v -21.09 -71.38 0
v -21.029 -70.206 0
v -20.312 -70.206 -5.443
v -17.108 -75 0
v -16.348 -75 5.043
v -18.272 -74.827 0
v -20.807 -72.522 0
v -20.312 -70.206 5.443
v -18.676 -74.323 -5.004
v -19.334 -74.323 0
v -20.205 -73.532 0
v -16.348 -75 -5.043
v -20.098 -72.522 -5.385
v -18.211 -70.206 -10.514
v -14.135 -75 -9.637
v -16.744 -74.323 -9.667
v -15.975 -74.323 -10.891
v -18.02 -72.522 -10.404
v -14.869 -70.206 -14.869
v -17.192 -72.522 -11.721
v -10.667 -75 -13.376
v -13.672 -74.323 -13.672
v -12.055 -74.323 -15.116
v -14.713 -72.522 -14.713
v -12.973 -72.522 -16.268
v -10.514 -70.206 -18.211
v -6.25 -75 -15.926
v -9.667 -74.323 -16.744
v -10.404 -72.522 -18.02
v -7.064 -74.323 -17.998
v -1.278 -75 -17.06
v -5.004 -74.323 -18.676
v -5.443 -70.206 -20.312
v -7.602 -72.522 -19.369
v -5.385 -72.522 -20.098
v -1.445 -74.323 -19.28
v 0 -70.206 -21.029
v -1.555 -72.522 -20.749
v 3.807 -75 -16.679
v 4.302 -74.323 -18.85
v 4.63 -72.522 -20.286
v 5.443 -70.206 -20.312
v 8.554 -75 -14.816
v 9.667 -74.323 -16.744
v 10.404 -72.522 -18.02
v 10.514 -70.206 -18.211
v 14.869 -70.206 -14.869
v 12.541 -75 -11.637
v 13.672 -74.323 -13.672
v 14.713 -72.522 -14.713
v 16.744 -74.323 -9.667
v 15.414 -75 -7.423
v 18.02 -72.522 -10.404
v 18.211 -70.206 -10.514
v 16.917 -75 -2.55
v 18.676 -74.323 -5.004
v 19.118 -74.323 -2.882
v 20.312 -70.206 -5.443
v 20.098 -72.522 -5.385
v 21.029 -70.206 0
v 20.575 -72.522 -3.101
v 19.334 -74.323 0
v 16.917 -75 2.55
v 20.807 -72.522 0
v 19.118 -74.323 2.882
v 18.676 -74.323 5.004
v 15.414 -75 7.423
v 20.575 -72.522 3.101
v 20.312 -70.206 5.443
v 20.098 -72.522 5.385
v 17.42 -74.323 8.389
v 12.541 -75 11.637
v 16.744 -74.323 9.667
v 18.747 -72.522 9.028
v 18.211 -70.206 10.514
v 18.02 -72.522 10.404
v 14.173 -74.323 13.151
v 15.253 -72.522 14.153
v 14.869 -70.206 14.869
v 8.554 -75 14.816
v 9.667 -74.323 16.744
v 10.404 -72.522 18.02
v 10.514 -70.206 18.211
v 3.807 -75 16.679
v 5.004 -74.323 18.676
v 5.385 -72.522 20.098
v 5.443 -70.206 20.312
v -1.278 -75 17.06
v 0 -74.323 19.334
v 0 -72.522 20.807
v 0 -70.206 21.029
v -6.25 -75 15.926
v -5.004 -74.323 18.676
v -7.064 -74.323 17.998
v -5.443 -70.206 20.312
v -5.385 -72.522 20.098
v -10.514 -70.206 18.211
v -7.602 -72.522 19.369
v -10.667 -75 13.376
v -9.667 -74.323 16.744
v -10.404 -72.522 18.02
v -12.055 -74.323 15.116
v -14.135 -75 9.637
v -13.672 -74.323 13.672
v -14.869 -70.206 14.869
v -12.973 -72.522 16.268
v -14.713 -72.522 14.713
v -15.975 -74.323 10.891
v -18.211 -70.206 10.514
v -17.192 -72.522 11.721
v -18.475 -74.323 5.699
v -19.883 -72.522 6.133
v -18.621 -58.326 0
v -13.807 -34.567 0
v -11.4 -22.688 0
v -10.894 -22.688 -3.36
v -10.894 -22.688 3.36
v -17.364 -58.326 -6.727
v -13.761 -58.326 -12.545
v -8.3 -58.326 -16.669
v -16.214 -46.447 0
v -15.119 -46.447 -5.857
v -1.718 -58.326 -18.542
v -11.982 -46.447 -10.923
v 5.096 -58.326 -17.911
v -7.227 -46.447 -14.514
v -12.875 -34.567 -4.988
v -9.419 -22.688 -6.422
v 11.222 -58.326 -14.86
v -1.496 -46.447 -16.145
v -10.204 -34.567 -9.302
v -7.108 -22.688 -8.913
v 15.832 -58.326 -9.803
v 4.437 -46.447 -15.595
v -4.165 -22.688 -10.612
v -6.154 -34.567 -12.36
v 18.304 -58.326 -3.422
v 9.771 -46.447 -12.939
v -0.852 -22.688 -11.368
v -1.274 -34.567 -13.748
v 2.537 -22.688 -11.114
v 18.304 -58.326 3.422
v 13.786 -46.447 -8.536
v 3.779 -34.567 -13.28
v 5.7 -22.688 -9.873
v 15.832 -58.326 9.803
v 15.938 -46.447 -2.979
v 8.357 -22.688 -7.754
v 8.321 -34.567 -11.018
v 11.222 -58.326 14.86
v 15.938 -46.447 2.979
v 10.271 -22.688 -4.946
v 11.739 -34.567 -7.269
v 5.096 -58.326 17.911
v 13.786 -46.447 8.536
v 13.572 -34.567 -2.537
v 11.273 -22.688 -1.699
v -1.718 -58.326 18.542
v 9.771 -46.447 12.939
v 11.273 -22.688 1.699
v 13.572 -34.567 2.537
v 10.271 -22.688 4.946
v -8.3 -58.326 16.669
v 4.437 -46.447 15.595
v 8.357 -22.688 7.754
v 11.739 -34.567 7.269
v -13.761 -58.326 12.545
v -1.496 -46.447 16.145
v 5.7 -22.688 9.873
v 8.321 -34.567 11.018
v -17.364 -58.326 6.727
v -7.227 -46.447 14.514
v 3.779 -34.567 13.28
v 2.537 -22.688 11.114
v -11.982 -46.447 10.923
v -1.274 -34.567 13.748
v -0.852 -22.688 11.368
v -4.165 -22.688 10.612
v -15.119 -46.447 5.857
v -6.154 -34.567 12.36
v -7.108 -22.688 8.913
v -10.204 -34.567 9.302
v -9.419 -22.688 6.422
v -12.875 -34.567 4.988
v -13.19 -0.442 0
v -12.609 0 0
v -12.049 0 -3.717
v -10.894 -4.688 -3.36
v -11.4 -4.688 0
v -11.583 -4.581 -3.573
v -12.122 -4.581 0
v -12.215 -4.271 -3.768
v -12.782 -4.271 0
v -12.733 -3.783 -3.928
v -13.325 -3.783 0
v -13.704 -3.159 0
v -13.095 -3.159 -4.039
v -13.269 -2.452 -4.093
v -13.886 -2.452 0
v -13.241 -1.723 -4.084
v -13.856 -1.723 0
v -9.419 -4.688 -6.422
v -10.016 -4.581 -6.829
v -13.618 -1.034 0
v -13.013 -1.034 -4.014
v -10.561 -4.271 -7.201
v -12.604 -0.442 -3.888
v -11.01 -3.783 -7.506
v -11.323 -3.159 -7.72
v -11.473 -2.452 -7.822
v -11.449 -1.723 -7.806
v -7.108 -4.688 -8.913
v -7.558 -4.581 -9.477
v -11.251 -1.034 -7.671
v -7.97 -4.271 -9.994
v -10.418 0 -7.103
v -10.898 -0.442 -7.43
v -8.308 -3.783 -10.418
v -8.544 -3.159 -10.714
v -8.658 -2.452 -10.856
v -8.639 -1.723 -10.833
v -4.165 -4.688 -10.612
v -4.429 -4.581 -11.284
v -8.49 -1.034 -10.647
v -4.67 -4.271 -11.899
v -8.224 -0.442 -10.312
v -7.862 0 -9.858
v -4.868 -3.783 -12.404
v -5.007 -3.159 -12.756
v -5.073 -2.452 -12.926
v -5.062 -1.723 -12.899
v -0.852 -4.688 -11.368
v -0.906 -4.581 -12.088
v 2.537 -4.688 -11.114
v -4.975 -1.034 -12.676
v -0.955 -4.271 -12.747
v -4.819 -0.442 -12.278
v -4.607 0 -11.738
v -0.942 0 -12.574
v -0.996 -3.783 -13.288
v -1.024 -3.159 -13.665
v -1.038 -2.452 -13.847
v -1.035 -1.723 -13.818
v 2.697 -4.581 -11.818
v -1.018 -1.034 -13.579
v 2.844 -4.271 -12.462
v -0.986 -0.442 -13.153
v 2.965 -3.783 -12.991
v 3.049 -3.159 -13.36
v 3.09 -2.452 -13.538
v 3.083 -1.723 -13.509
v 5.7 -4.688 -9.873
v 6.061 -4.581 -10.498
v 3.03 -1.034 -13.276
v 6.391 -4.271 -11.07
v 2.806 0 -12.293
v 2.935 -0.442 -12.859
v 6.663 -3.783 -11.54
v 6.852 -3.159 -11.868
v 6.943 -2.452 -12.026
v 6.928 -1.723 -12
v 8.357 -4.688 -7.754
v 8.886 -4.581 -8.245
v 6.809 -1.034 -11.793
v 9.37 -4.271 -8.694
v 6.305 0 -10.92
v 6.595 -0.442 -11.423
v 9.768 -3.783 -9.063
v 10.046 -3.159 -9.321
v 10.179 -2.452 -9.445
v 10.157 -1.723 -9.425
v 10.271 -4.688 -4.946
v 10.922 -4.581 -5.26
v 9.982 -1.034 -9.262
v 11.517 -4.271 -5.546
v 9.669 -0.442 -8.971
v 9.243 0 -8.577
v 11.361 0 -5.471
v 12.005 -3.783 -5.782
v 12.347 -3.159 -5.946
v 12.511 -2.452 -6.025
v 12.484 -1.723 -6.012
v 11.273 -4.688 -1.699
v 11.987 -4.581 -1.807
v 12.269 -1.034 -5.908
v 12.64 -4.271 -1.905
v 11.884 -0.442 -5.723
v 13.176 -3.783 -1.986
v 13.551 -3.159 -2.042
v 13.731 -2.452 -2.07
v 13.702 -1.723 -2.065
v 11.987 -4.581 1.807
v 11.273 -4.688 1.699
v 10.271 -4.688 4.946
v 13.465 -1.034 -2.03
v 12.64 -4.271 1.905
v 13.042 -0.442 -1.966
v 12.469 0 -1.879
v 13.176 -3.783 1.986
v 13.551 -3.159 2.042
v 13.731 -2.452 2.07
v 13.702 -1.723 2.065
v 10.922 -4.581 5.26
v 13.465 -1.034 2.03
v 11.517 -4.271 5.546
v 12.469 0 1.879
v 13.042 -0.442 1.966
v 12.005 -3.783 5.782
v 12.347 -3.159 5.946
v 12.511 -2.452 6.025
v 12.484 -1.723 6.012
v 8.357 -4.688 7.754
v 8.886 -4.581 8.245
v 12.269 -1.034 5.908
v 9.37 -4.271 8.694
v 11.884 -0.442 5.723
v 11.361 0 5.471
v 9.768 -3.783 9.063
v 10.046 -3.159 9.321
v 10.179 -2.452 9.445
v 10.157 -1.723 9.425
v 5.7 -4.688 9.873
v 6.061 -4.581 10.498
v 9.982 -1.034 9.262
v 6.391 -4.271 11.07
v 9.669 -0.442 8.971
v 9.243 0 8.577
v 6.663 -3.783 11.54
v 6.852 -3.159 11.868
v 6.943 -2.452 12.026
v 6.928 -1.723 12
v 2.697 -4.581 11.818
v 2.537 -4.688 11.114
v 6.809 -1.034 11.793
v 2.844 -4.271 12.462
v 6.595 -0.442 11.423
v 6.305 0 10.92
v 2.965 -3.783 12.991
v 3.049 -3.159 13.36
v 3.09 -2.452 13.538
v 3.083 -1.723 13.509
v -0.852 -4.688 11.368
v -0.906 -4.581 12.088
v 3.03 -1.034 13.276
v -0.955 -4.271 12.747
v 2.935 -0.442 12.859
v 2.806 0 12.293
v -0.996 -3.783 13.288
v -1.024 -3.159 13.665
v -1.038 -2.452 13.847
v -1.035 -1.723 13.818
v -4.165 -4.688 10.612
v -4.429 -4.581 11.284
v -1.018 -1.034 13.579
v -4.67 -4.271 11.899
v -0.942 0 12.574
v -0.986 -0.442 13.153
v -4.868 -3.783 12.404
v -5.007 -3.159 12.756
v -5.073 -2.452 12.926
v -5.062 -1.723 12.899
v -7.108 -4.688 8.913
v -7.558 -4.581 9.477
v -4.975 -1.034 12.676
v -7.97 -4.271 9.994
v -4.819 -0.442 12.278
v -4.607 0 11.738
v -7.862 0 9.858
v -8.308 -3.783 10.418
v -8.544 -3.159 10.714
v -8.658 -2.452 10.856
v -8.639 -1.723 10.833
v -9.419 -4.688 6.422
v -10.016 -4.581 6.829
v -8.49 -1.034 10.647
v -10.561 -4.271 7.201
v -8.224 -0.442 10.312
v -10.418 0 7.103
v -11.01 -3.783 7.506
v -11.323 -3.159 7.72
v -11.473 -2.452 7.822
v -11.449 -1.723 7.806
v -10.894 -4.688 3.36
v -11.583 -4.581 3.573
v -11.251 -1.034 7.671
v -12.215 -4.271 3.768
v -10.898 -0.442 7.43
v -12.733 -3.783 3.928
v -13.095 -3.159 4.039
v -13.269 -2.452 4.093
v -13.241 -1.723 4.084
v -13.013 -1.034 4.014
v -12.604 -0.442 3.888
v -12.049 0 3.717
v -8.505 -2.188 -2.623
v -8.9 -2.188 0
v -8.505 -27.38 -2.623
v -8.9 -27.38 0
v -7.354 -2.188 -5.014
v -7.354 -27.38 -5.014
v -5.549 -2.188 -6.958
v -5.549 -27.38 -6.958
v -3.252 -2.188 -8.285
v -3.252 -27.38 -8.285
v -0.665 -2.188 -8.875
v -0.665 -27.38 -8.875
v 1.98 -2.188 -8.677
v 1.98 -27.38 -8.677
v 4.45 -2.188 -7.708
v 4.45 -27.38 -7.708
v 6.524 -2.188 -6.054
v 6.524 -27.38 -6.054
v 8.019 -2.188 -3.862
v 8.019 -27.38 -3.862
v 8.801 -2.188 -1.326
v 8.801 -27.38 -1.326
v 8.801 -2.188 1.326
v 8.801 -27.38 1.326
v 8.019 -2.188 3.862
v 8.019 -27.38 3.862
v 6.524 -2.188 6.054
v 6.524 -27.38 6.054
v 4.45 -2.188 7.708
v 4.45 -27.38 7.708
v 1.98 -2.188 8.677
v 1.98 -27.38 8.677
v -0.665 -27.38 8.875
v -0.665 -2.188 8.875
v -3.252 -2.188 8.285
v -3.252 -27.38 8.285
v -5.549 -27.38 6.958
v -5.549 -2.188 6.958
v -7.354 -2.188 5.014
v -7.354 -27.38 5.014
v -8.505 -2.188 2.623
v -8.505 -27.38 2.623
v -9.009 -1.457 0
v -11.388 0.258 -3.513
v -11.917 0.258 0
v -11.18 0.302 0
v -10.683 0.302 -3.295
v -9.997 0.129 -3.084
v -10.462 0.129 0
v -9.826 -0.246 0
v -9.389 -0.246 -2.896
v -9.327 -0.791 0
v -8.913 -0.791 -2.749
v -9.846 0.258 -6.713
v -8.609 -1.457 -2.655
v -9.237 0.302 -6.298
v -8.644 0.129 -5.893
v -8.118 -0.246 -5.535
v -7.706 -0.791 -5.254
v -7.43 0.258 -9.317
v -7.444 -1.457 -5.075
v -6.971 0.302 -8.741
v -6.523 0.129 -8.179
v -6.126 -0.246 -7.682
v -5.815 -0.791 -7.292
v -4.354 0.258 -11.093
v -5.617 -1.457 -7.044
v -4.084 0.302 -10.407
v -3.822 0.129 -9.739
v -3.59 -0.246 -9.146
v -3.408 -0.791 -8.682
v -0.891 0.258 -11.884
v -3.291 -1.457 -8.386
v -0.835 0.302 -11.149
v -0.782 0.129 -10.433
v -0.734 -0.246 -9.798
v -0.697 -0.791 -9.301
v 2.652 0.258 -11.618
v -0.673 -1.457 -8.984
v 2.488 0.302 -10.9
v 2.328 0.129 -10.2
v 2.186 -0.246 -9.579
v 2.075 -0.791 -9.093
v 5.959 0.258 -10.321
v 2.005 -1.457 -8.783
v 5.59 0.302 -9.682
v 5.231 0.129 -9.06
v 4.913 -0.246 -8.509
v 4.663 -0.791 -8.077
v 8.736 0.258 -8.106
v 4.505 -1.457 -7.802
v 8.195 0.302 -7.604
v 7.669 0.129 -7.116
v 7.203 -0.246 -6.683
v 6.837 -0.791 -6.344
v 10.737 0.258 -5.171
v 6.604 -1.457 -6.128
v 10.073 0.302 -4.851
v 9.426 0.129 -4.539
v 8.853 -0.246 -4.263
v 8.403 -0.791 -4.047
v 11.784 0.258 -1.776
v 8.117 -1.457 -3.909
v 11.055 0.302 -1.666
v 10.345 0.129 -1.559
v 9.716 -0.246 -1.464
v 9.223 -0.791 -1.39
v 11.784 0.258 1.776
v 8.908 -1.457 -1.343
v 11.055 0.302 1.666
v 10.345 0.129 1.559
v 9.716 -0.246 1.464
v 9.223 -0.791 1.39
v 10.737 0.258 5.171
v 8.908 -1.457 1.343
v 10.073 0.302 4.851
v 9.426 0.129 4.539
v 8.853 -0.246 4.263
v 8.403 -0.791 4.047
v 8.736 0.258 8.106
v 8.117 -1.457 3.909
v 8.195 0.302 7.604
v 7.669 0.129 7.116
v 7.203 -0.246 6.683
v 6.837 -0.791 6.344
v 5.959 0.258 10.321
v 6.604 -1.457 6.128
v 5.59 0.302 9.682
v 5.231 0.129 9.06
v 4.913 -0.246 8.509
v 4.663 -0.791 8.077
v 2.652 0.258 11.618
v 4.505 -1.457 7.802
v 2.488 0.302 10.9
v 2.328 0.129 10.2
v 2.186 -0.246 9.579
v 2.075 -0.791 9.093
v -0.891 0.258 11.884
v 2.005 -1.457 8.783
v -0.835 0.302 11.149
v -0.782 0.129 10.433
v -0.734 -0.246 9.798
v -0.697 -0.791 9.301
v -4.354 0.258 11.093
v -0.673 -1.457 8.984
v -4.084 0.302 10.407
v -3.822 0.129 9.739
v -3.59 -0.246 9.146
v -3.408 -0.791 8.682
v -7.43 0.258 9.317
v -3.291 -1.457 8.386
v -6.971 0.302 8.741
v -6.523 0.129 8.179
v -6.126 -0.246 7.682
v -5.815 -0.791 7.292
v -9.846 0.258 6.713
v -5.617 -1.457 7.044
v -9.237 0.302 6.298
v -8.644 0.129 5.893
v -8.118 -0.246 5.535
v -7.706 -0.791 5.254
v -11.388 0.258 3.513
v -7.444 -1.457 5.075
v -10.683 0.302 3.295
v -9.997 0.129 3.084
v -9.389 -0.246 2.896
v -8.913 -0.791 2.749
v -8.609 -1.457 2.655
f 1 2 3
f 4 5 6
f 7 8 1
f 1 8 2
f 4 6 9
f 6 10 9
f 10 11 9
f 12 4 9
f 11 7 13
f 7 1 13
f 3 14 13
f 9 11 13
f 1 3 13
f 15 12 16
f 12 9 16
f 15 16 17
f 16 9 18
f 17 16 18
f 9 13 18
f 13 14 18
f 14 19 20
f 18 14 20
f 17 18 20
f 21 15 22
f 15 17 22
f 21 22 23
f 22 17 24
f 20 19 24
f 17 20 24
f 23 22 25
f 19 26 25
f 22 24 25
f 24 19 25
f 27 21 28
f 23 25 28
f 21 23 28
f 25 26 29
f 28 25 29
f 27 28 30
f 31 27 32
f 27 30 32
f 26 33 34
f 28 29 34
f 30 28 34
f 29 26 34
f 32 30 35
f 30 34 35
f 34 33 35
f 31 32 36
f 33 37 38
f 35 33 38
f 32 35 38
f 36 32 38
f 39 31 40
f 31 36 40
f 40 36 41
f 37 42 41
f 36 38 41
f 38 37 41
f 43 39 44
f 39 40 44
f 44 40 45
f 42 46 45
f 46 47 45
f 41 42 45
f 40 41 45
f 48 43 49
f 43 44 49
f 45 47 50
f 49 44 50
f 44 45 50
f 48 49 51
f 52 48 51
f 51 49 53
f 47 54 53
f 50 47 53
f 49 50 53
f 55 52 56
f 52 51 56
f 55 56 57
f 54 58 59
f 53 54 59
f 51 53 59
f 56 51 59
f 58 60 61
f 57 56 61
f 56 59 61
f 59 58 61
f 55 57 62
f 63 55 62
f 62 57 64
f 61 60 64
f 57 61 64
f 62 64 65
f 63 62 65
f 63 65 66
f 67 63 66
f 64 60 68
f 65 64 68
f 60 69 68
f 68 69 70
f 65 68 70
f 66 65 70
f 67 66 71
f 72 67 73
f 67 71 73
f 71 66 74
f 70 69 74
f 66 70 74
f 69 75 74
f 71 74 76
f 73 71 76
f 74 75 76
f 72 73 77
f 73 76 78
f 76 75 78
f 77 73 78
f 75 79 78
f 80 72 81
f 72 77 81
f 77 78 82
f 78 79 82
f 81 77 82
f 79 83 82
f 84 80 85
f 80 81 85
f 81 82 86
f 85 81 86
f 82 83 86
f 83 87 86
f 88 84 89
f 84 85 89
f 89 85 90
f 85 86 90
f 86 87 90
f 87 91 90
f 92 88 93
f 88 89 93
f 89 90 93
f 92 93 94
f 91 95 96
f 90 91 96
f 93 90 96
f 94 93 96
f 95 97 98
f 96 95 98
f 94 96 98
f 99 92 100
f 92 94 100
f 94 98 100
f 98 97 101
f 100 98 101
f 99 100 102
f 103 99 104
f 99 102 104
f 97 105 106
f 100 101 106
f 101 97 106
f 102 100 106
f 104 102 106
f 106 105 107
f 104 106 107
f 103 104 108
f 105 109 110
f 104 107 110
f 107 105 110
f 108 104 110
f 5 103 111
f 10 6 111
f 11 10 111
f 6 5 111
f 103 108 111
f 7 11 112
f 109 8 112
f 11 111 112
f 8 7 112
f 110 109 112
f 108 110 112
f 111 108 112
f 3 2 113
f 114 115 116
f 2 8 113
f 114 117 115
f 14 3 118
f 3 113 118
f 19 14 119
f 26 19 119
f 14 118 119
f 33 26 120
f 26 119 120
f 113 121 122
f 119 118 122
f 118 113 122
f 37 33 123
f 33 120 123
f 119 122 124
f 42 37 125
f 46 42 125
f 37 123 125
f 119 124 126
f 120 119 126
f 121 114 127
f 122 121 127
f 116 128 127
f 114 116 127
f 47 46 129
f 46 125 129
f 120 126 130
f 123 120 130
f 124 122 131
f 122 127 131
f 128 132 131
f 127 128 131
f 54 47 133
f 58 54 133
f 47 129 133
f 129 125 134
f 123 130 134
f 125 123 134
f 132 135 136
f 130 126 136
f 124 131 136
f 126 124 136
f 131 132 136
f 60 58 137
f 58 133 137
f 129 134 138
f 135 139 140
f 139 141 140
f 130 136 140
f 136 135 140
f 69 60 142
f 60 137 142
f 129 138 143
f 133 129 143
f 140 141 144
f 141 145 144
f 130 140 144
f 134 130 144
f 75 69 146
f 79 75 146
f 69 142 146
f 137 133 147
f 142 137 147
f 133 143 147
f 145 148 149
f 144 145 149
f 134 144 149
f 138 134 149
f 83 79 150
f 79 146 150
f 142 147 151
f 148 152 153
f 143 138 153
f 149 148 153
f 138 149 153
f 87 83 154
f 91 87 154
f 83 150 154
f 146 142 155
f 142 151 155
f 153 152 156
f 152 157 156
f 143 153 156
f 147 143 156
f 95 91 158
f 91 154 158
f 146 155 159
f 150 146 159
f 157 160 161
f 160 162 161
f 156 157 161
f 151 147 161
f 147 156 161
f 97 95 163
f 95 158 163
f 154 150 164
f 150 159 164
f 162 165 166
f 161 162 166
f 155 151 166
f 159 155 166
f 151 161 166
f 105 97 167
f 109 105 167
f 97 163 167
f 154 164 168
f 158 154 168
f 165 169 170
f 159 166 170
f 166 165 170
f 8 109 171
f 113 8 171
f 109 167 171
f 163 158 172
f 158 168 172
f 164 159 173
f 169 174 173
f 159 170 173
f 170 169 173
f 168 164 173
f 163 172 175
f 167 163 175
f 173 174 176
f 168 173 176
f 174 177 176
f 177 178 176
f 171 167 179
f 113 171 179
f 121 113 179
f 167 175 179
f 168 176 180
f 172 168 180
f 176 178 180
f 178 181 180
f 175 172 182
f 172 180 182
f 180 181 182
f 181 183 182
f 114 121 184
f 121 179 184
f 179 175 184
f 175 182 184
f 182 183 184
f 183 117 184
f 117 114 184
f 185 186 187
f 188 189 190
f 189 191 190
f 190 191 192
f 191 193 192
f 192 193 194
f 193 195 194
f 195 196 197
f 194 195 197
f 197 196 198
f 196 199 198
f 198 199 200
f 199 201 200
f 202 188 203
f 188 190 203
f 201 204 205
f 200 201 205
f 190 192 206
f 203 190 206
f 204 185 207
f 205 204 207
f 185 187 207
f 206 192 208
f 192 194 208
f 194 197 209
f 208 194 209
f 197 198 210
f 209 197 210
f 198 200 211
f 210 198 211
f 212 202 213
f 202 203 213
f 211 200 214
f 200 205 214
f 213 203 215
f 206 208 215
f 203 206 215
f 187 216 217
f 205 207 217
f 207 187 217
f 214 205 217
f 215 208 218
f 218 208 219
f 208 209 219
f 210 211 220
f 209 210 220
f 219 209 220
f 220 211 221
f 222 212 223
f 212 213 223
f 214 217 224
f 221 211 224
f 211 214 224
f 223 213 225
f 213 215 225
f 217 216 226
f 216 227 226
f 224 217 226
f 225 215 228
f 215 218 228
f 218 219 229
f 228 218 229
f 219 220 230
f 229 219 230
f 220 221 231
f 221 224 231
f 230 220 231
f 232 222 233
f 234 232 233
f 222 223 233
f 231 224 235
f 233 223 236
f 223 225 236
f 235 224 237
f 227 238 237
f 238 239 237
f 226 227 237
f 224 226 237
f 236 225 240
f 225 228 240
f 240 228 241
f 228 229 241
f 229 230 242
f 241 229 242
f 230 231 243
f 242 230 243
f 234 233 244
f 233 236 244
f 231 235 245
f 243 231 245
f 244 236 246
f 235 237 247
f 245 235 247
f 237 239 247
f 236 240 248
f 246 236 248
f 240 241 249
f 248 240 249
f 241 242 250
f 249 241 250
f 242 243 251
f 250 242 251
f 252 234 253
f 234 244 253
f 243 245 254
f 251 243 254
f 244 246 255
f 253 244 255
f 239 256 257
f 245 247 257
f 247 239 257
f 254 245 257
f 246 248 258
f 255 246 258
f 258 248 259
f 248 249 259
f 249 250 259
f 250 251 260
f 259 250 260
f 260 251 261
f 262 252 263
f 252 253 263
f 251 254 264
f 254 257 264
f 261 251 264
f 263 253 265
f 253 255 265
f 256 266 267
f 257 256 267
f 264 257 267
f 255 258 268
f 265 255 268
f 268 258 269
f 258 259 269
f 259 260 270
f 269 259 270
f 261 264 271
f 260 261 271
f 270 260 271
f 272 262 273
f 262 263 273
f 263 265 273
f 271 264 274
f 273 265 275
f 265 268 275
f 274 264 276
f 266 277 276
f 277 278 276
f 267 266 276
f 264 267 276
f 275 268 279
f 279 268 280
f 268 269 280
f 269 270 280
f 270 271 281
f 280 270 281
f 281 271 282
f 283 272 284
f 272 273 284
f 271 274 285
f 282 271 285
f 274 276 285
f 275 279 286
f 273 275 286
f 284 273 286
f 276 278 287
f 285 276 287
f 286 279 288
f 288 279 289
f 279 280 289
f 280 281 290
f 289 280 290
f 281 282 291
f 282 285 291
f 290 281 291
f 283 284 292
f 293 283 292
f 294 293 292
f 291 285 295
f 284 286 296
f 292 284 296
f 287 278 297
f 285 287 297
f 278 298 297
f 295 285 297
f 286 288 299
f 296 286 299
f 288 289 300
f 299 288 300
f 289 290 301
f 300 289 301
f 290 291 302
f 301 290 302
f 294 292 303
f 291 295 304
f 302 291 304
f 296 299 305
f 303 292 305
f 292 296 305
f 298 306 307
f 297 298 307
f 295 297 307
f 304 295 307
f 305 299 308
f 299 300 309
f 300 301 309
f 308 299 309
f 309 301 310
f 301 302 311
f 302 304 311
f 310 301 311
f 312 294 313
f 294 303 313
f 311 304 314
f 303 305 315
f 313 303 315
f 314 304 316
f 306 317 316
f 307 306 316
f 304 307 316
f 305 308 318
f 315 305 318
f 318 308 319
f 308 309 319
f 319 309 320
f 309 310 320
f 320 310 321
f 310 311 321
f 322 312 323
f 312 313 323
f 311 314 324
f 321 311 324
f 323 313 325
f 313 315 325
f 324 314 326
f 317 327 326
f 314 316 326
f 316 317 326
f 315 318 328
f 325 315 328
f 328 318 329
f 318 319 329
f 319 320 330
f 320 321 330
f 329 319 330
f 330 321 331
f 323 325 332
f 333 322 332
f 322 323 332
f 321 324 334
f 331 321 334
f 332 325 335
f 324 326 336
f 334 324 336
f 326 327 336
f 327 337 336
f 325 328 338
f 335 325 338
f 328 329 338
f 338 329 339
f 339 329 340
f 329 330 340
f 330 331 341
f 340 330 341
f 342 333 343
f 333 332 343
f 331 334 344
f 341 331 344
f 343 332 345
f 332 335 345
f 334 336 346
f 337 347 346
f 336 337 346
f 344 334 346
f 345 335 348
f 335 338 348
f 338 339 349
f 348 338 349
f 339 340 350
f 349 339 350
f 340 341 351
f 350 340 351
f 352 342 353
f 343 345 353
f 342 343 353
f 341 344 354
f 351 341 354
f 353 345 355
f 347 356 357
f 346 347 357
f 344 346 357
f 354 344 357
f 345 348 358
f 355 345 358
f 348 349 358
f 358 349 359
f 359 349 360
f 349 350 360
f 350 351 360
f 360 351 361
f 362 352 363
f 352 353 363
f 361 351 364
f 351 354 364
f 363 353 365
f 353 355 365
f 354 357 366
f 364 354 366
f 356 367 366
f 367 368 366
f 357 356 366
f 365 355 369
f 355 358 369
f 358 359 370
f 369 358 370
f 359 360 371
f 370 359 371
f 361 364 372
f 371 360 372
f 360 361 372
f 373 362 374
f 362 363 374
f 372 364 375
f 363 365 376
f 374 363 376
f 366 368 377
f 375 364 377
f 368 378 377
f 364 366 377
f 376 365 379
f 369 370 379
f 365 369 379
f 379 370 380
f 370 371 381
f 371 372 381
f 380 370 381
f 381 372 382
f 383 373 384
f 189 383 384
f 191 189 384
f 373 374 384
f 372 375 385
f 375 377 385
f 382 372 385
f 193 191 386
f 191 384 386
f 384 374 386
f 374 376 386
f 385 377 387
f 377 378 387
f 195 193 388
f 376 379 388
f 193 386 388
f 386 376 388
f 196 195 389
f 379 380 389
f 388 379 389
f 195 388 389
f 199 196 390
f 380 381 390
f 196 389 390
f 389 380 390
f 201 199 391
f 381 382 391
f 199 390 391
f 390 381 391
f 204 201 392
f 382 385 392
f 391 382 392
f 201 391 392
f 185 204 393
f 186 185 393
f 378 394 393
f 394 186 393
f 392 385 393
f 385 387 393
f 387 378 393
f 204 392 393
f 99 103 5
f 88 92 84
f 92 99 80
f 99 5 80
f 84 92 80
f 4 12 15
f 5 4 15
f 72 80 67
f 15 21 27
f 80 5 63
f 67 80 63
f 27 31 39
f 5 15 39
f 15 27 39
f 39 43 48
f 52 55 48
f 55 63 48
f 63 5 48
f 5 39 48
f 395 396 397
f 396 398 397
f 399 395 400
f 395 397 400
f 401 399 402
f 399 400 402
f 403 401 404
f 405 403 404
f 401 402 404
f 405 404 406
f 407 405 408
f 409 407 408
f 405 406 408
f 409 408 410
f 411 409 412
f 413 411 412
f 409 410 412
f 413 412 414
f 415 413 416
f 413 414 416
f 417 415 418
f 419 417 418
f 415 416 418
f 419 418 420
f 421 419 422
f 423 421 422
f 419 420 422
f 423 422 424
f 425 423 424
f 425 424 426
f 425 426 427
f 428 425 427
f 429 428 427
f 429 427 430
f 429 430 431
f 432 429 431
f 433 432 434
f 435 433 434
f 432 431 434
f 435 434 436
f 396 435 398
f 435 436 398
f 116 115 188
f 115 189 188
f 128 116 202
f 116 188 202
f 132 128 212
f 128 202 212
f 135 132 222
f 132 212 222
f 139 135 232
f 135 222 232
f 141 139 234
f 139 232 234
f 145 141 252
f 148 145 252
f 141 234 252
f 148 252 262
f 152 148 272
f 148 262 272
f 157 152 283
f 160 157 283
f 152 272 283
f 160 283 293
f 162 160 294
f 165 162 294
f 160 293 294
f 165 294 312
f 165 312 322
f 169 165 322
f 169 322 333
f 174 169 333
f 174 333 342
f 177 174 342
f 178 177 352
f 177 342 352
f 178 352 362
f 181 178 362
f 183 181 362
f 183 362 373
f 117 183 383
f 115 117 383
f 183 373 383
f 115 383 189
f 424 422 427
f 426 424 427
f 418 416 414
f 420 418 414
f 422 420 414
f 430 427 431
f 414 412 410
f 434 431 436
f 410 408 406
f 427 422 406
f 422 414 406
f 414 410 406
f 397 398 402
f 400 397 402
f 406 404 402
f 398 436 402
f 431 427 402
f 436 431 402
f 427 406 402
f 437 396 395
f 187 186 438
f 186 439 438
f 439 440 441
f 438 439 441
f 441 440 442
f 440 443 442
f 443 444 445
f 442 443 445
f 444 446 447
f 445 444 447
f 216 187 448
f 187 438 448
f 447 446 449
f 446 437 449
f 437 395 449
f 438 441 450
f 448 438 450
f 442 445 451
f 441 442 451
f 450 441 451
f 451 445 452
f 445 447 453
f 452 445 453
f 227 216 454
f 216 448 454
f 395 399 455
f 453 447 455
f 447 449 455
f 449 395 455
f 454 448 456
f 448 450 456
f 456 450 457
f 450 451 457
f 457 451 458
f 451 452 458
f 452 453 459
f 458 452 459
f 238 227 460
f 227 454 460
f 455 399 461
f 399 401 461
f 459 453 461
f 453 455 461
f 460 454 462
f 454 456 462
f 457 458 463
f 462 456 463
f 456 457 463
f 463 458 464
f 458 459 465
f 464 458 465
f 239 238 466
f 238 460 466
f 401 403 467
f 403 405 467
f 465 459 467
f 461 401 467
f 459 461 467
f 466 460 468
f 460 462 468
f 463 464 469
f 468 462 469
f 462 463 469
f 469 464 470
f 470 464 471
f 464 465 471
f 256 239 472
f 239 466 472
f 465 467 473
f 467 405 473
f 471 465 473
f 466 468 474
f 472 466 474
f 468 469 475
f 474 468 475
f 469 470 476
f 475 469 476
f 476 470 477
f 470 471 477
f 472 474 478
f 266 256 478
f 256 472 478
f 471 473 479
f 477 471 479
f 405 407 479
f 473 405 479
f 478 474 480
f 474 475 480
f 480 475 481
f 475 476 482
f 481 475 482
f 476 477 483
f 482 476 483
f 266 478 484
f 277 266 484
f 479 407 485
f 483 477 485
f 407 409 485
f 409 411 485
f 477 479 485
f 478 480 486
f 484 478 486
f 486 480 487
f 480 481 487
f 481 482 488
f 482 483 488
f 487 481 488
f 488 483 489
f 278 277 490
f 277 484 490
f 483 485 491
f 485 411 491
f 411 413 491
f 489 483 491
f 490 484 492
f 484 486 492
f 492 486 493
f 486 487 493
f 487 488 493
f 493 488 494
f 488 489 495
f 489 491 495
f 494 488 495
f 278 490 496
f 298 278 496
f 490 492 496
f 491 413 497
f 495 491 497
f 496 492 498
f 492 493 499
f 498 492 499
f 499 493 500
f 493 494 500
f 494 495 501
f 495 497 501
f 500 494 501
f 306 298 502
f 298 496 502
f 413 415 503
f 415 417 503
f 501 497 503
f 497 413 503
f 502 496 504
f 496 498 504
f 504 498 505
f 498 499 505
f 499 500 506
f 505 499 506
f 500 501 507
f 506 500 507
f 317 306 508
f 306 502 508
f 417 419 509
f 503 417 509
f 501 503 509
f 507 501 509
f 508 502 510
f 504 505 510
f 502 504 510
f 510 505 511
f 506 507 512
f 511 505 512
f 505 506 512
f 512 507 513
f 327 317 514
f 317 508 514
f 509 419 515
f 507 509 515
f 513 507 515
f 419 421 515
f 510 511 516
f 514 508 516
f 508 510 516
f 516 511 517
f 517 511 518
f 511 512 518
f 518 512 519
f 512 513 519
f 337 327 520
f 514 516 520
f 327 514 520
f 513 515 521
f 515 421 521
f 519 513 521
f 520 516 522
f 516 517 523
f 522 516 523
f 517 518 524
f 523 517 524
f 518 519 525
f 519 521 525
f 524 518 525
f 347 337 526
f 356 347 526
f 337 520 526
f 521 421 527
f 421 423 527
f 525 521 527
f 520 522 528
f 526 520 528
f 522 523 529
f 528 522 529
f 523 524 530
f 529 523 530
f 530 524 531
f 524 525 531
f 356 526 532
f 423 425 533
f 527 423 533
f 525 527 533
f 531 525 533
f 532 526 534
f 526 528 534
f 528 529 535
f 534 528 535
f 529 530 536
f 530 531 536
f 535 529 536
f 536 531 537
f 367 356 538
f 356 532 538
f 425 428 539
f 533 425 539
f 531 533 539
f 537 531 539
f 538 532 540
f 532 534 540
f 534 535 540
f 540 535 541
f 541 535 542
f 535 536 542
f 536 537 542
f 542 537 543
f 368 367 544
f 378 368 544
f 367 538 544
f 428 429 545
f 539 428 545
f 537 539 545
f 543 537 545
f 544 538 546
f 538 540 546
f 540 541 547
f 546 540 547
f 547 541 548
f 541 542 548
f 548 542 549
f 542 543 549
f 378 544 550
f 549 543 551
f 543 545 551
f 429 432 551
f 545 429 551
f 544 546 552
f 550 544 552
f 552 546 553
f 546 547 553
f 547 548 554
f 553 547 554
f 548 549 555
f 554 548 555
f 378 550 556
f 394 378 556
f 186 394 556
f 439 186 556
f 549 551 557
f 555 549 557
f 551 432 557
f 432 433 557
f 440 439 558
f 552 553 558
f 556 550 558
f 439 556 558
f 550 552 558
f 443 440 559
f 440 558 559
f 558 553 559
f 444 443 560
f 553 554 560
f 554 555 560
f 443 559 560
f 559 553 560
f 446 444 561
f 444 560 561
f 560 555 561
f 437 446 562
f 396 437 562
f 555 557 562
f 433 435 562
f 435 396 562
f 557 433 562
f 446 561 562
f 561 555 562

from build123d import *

# Parameters (mm, degrees)
FILLET1_R = 4


with BuildPart() as part:
    # Sketch1 → Revolve1 (revolve)
    with BuildSketch(Plane.XY, mode=Mode.PRIVATE) as revolve1_sk:
        with BuildLine():
            ThreePointArc((12.609380103, 0), (10.129852422, -0.034707115), (8.9, -2.188012744))
            Line((8.9, -2.188012744), (8.9, -27.380086709))
            Line((8.9, -27.380086709), (0, -27.380086709))
            Line((0, -27.380086709), (0, -75))
            Line((0, -75), (22, -75))
            Line((22, -75), (11.4, -22.688012744))
            Line((11.4, -22.688012744), (11.4, -4.688012744))
            ThreePointArc((11.4, -4.688012744), (13.820746978, -2.81249979), (12.609380103, 0))
        make_face()
    revolve(revolve1_sk.sketch.rotate(Axis((0, -27.380086709, 0), (0, -1, 0)), 180), axis=Axis((0, -27.380086709, 0), (0, -1, 0)))

    # Fillet1
    fillet1_edges = [part.edges().sort_by_distance(p)[0] for p in [
        (22, -75, 0),
    ]]
    fillet(fillet1_edges, radius=FILLET1_R)


solid = part.part
